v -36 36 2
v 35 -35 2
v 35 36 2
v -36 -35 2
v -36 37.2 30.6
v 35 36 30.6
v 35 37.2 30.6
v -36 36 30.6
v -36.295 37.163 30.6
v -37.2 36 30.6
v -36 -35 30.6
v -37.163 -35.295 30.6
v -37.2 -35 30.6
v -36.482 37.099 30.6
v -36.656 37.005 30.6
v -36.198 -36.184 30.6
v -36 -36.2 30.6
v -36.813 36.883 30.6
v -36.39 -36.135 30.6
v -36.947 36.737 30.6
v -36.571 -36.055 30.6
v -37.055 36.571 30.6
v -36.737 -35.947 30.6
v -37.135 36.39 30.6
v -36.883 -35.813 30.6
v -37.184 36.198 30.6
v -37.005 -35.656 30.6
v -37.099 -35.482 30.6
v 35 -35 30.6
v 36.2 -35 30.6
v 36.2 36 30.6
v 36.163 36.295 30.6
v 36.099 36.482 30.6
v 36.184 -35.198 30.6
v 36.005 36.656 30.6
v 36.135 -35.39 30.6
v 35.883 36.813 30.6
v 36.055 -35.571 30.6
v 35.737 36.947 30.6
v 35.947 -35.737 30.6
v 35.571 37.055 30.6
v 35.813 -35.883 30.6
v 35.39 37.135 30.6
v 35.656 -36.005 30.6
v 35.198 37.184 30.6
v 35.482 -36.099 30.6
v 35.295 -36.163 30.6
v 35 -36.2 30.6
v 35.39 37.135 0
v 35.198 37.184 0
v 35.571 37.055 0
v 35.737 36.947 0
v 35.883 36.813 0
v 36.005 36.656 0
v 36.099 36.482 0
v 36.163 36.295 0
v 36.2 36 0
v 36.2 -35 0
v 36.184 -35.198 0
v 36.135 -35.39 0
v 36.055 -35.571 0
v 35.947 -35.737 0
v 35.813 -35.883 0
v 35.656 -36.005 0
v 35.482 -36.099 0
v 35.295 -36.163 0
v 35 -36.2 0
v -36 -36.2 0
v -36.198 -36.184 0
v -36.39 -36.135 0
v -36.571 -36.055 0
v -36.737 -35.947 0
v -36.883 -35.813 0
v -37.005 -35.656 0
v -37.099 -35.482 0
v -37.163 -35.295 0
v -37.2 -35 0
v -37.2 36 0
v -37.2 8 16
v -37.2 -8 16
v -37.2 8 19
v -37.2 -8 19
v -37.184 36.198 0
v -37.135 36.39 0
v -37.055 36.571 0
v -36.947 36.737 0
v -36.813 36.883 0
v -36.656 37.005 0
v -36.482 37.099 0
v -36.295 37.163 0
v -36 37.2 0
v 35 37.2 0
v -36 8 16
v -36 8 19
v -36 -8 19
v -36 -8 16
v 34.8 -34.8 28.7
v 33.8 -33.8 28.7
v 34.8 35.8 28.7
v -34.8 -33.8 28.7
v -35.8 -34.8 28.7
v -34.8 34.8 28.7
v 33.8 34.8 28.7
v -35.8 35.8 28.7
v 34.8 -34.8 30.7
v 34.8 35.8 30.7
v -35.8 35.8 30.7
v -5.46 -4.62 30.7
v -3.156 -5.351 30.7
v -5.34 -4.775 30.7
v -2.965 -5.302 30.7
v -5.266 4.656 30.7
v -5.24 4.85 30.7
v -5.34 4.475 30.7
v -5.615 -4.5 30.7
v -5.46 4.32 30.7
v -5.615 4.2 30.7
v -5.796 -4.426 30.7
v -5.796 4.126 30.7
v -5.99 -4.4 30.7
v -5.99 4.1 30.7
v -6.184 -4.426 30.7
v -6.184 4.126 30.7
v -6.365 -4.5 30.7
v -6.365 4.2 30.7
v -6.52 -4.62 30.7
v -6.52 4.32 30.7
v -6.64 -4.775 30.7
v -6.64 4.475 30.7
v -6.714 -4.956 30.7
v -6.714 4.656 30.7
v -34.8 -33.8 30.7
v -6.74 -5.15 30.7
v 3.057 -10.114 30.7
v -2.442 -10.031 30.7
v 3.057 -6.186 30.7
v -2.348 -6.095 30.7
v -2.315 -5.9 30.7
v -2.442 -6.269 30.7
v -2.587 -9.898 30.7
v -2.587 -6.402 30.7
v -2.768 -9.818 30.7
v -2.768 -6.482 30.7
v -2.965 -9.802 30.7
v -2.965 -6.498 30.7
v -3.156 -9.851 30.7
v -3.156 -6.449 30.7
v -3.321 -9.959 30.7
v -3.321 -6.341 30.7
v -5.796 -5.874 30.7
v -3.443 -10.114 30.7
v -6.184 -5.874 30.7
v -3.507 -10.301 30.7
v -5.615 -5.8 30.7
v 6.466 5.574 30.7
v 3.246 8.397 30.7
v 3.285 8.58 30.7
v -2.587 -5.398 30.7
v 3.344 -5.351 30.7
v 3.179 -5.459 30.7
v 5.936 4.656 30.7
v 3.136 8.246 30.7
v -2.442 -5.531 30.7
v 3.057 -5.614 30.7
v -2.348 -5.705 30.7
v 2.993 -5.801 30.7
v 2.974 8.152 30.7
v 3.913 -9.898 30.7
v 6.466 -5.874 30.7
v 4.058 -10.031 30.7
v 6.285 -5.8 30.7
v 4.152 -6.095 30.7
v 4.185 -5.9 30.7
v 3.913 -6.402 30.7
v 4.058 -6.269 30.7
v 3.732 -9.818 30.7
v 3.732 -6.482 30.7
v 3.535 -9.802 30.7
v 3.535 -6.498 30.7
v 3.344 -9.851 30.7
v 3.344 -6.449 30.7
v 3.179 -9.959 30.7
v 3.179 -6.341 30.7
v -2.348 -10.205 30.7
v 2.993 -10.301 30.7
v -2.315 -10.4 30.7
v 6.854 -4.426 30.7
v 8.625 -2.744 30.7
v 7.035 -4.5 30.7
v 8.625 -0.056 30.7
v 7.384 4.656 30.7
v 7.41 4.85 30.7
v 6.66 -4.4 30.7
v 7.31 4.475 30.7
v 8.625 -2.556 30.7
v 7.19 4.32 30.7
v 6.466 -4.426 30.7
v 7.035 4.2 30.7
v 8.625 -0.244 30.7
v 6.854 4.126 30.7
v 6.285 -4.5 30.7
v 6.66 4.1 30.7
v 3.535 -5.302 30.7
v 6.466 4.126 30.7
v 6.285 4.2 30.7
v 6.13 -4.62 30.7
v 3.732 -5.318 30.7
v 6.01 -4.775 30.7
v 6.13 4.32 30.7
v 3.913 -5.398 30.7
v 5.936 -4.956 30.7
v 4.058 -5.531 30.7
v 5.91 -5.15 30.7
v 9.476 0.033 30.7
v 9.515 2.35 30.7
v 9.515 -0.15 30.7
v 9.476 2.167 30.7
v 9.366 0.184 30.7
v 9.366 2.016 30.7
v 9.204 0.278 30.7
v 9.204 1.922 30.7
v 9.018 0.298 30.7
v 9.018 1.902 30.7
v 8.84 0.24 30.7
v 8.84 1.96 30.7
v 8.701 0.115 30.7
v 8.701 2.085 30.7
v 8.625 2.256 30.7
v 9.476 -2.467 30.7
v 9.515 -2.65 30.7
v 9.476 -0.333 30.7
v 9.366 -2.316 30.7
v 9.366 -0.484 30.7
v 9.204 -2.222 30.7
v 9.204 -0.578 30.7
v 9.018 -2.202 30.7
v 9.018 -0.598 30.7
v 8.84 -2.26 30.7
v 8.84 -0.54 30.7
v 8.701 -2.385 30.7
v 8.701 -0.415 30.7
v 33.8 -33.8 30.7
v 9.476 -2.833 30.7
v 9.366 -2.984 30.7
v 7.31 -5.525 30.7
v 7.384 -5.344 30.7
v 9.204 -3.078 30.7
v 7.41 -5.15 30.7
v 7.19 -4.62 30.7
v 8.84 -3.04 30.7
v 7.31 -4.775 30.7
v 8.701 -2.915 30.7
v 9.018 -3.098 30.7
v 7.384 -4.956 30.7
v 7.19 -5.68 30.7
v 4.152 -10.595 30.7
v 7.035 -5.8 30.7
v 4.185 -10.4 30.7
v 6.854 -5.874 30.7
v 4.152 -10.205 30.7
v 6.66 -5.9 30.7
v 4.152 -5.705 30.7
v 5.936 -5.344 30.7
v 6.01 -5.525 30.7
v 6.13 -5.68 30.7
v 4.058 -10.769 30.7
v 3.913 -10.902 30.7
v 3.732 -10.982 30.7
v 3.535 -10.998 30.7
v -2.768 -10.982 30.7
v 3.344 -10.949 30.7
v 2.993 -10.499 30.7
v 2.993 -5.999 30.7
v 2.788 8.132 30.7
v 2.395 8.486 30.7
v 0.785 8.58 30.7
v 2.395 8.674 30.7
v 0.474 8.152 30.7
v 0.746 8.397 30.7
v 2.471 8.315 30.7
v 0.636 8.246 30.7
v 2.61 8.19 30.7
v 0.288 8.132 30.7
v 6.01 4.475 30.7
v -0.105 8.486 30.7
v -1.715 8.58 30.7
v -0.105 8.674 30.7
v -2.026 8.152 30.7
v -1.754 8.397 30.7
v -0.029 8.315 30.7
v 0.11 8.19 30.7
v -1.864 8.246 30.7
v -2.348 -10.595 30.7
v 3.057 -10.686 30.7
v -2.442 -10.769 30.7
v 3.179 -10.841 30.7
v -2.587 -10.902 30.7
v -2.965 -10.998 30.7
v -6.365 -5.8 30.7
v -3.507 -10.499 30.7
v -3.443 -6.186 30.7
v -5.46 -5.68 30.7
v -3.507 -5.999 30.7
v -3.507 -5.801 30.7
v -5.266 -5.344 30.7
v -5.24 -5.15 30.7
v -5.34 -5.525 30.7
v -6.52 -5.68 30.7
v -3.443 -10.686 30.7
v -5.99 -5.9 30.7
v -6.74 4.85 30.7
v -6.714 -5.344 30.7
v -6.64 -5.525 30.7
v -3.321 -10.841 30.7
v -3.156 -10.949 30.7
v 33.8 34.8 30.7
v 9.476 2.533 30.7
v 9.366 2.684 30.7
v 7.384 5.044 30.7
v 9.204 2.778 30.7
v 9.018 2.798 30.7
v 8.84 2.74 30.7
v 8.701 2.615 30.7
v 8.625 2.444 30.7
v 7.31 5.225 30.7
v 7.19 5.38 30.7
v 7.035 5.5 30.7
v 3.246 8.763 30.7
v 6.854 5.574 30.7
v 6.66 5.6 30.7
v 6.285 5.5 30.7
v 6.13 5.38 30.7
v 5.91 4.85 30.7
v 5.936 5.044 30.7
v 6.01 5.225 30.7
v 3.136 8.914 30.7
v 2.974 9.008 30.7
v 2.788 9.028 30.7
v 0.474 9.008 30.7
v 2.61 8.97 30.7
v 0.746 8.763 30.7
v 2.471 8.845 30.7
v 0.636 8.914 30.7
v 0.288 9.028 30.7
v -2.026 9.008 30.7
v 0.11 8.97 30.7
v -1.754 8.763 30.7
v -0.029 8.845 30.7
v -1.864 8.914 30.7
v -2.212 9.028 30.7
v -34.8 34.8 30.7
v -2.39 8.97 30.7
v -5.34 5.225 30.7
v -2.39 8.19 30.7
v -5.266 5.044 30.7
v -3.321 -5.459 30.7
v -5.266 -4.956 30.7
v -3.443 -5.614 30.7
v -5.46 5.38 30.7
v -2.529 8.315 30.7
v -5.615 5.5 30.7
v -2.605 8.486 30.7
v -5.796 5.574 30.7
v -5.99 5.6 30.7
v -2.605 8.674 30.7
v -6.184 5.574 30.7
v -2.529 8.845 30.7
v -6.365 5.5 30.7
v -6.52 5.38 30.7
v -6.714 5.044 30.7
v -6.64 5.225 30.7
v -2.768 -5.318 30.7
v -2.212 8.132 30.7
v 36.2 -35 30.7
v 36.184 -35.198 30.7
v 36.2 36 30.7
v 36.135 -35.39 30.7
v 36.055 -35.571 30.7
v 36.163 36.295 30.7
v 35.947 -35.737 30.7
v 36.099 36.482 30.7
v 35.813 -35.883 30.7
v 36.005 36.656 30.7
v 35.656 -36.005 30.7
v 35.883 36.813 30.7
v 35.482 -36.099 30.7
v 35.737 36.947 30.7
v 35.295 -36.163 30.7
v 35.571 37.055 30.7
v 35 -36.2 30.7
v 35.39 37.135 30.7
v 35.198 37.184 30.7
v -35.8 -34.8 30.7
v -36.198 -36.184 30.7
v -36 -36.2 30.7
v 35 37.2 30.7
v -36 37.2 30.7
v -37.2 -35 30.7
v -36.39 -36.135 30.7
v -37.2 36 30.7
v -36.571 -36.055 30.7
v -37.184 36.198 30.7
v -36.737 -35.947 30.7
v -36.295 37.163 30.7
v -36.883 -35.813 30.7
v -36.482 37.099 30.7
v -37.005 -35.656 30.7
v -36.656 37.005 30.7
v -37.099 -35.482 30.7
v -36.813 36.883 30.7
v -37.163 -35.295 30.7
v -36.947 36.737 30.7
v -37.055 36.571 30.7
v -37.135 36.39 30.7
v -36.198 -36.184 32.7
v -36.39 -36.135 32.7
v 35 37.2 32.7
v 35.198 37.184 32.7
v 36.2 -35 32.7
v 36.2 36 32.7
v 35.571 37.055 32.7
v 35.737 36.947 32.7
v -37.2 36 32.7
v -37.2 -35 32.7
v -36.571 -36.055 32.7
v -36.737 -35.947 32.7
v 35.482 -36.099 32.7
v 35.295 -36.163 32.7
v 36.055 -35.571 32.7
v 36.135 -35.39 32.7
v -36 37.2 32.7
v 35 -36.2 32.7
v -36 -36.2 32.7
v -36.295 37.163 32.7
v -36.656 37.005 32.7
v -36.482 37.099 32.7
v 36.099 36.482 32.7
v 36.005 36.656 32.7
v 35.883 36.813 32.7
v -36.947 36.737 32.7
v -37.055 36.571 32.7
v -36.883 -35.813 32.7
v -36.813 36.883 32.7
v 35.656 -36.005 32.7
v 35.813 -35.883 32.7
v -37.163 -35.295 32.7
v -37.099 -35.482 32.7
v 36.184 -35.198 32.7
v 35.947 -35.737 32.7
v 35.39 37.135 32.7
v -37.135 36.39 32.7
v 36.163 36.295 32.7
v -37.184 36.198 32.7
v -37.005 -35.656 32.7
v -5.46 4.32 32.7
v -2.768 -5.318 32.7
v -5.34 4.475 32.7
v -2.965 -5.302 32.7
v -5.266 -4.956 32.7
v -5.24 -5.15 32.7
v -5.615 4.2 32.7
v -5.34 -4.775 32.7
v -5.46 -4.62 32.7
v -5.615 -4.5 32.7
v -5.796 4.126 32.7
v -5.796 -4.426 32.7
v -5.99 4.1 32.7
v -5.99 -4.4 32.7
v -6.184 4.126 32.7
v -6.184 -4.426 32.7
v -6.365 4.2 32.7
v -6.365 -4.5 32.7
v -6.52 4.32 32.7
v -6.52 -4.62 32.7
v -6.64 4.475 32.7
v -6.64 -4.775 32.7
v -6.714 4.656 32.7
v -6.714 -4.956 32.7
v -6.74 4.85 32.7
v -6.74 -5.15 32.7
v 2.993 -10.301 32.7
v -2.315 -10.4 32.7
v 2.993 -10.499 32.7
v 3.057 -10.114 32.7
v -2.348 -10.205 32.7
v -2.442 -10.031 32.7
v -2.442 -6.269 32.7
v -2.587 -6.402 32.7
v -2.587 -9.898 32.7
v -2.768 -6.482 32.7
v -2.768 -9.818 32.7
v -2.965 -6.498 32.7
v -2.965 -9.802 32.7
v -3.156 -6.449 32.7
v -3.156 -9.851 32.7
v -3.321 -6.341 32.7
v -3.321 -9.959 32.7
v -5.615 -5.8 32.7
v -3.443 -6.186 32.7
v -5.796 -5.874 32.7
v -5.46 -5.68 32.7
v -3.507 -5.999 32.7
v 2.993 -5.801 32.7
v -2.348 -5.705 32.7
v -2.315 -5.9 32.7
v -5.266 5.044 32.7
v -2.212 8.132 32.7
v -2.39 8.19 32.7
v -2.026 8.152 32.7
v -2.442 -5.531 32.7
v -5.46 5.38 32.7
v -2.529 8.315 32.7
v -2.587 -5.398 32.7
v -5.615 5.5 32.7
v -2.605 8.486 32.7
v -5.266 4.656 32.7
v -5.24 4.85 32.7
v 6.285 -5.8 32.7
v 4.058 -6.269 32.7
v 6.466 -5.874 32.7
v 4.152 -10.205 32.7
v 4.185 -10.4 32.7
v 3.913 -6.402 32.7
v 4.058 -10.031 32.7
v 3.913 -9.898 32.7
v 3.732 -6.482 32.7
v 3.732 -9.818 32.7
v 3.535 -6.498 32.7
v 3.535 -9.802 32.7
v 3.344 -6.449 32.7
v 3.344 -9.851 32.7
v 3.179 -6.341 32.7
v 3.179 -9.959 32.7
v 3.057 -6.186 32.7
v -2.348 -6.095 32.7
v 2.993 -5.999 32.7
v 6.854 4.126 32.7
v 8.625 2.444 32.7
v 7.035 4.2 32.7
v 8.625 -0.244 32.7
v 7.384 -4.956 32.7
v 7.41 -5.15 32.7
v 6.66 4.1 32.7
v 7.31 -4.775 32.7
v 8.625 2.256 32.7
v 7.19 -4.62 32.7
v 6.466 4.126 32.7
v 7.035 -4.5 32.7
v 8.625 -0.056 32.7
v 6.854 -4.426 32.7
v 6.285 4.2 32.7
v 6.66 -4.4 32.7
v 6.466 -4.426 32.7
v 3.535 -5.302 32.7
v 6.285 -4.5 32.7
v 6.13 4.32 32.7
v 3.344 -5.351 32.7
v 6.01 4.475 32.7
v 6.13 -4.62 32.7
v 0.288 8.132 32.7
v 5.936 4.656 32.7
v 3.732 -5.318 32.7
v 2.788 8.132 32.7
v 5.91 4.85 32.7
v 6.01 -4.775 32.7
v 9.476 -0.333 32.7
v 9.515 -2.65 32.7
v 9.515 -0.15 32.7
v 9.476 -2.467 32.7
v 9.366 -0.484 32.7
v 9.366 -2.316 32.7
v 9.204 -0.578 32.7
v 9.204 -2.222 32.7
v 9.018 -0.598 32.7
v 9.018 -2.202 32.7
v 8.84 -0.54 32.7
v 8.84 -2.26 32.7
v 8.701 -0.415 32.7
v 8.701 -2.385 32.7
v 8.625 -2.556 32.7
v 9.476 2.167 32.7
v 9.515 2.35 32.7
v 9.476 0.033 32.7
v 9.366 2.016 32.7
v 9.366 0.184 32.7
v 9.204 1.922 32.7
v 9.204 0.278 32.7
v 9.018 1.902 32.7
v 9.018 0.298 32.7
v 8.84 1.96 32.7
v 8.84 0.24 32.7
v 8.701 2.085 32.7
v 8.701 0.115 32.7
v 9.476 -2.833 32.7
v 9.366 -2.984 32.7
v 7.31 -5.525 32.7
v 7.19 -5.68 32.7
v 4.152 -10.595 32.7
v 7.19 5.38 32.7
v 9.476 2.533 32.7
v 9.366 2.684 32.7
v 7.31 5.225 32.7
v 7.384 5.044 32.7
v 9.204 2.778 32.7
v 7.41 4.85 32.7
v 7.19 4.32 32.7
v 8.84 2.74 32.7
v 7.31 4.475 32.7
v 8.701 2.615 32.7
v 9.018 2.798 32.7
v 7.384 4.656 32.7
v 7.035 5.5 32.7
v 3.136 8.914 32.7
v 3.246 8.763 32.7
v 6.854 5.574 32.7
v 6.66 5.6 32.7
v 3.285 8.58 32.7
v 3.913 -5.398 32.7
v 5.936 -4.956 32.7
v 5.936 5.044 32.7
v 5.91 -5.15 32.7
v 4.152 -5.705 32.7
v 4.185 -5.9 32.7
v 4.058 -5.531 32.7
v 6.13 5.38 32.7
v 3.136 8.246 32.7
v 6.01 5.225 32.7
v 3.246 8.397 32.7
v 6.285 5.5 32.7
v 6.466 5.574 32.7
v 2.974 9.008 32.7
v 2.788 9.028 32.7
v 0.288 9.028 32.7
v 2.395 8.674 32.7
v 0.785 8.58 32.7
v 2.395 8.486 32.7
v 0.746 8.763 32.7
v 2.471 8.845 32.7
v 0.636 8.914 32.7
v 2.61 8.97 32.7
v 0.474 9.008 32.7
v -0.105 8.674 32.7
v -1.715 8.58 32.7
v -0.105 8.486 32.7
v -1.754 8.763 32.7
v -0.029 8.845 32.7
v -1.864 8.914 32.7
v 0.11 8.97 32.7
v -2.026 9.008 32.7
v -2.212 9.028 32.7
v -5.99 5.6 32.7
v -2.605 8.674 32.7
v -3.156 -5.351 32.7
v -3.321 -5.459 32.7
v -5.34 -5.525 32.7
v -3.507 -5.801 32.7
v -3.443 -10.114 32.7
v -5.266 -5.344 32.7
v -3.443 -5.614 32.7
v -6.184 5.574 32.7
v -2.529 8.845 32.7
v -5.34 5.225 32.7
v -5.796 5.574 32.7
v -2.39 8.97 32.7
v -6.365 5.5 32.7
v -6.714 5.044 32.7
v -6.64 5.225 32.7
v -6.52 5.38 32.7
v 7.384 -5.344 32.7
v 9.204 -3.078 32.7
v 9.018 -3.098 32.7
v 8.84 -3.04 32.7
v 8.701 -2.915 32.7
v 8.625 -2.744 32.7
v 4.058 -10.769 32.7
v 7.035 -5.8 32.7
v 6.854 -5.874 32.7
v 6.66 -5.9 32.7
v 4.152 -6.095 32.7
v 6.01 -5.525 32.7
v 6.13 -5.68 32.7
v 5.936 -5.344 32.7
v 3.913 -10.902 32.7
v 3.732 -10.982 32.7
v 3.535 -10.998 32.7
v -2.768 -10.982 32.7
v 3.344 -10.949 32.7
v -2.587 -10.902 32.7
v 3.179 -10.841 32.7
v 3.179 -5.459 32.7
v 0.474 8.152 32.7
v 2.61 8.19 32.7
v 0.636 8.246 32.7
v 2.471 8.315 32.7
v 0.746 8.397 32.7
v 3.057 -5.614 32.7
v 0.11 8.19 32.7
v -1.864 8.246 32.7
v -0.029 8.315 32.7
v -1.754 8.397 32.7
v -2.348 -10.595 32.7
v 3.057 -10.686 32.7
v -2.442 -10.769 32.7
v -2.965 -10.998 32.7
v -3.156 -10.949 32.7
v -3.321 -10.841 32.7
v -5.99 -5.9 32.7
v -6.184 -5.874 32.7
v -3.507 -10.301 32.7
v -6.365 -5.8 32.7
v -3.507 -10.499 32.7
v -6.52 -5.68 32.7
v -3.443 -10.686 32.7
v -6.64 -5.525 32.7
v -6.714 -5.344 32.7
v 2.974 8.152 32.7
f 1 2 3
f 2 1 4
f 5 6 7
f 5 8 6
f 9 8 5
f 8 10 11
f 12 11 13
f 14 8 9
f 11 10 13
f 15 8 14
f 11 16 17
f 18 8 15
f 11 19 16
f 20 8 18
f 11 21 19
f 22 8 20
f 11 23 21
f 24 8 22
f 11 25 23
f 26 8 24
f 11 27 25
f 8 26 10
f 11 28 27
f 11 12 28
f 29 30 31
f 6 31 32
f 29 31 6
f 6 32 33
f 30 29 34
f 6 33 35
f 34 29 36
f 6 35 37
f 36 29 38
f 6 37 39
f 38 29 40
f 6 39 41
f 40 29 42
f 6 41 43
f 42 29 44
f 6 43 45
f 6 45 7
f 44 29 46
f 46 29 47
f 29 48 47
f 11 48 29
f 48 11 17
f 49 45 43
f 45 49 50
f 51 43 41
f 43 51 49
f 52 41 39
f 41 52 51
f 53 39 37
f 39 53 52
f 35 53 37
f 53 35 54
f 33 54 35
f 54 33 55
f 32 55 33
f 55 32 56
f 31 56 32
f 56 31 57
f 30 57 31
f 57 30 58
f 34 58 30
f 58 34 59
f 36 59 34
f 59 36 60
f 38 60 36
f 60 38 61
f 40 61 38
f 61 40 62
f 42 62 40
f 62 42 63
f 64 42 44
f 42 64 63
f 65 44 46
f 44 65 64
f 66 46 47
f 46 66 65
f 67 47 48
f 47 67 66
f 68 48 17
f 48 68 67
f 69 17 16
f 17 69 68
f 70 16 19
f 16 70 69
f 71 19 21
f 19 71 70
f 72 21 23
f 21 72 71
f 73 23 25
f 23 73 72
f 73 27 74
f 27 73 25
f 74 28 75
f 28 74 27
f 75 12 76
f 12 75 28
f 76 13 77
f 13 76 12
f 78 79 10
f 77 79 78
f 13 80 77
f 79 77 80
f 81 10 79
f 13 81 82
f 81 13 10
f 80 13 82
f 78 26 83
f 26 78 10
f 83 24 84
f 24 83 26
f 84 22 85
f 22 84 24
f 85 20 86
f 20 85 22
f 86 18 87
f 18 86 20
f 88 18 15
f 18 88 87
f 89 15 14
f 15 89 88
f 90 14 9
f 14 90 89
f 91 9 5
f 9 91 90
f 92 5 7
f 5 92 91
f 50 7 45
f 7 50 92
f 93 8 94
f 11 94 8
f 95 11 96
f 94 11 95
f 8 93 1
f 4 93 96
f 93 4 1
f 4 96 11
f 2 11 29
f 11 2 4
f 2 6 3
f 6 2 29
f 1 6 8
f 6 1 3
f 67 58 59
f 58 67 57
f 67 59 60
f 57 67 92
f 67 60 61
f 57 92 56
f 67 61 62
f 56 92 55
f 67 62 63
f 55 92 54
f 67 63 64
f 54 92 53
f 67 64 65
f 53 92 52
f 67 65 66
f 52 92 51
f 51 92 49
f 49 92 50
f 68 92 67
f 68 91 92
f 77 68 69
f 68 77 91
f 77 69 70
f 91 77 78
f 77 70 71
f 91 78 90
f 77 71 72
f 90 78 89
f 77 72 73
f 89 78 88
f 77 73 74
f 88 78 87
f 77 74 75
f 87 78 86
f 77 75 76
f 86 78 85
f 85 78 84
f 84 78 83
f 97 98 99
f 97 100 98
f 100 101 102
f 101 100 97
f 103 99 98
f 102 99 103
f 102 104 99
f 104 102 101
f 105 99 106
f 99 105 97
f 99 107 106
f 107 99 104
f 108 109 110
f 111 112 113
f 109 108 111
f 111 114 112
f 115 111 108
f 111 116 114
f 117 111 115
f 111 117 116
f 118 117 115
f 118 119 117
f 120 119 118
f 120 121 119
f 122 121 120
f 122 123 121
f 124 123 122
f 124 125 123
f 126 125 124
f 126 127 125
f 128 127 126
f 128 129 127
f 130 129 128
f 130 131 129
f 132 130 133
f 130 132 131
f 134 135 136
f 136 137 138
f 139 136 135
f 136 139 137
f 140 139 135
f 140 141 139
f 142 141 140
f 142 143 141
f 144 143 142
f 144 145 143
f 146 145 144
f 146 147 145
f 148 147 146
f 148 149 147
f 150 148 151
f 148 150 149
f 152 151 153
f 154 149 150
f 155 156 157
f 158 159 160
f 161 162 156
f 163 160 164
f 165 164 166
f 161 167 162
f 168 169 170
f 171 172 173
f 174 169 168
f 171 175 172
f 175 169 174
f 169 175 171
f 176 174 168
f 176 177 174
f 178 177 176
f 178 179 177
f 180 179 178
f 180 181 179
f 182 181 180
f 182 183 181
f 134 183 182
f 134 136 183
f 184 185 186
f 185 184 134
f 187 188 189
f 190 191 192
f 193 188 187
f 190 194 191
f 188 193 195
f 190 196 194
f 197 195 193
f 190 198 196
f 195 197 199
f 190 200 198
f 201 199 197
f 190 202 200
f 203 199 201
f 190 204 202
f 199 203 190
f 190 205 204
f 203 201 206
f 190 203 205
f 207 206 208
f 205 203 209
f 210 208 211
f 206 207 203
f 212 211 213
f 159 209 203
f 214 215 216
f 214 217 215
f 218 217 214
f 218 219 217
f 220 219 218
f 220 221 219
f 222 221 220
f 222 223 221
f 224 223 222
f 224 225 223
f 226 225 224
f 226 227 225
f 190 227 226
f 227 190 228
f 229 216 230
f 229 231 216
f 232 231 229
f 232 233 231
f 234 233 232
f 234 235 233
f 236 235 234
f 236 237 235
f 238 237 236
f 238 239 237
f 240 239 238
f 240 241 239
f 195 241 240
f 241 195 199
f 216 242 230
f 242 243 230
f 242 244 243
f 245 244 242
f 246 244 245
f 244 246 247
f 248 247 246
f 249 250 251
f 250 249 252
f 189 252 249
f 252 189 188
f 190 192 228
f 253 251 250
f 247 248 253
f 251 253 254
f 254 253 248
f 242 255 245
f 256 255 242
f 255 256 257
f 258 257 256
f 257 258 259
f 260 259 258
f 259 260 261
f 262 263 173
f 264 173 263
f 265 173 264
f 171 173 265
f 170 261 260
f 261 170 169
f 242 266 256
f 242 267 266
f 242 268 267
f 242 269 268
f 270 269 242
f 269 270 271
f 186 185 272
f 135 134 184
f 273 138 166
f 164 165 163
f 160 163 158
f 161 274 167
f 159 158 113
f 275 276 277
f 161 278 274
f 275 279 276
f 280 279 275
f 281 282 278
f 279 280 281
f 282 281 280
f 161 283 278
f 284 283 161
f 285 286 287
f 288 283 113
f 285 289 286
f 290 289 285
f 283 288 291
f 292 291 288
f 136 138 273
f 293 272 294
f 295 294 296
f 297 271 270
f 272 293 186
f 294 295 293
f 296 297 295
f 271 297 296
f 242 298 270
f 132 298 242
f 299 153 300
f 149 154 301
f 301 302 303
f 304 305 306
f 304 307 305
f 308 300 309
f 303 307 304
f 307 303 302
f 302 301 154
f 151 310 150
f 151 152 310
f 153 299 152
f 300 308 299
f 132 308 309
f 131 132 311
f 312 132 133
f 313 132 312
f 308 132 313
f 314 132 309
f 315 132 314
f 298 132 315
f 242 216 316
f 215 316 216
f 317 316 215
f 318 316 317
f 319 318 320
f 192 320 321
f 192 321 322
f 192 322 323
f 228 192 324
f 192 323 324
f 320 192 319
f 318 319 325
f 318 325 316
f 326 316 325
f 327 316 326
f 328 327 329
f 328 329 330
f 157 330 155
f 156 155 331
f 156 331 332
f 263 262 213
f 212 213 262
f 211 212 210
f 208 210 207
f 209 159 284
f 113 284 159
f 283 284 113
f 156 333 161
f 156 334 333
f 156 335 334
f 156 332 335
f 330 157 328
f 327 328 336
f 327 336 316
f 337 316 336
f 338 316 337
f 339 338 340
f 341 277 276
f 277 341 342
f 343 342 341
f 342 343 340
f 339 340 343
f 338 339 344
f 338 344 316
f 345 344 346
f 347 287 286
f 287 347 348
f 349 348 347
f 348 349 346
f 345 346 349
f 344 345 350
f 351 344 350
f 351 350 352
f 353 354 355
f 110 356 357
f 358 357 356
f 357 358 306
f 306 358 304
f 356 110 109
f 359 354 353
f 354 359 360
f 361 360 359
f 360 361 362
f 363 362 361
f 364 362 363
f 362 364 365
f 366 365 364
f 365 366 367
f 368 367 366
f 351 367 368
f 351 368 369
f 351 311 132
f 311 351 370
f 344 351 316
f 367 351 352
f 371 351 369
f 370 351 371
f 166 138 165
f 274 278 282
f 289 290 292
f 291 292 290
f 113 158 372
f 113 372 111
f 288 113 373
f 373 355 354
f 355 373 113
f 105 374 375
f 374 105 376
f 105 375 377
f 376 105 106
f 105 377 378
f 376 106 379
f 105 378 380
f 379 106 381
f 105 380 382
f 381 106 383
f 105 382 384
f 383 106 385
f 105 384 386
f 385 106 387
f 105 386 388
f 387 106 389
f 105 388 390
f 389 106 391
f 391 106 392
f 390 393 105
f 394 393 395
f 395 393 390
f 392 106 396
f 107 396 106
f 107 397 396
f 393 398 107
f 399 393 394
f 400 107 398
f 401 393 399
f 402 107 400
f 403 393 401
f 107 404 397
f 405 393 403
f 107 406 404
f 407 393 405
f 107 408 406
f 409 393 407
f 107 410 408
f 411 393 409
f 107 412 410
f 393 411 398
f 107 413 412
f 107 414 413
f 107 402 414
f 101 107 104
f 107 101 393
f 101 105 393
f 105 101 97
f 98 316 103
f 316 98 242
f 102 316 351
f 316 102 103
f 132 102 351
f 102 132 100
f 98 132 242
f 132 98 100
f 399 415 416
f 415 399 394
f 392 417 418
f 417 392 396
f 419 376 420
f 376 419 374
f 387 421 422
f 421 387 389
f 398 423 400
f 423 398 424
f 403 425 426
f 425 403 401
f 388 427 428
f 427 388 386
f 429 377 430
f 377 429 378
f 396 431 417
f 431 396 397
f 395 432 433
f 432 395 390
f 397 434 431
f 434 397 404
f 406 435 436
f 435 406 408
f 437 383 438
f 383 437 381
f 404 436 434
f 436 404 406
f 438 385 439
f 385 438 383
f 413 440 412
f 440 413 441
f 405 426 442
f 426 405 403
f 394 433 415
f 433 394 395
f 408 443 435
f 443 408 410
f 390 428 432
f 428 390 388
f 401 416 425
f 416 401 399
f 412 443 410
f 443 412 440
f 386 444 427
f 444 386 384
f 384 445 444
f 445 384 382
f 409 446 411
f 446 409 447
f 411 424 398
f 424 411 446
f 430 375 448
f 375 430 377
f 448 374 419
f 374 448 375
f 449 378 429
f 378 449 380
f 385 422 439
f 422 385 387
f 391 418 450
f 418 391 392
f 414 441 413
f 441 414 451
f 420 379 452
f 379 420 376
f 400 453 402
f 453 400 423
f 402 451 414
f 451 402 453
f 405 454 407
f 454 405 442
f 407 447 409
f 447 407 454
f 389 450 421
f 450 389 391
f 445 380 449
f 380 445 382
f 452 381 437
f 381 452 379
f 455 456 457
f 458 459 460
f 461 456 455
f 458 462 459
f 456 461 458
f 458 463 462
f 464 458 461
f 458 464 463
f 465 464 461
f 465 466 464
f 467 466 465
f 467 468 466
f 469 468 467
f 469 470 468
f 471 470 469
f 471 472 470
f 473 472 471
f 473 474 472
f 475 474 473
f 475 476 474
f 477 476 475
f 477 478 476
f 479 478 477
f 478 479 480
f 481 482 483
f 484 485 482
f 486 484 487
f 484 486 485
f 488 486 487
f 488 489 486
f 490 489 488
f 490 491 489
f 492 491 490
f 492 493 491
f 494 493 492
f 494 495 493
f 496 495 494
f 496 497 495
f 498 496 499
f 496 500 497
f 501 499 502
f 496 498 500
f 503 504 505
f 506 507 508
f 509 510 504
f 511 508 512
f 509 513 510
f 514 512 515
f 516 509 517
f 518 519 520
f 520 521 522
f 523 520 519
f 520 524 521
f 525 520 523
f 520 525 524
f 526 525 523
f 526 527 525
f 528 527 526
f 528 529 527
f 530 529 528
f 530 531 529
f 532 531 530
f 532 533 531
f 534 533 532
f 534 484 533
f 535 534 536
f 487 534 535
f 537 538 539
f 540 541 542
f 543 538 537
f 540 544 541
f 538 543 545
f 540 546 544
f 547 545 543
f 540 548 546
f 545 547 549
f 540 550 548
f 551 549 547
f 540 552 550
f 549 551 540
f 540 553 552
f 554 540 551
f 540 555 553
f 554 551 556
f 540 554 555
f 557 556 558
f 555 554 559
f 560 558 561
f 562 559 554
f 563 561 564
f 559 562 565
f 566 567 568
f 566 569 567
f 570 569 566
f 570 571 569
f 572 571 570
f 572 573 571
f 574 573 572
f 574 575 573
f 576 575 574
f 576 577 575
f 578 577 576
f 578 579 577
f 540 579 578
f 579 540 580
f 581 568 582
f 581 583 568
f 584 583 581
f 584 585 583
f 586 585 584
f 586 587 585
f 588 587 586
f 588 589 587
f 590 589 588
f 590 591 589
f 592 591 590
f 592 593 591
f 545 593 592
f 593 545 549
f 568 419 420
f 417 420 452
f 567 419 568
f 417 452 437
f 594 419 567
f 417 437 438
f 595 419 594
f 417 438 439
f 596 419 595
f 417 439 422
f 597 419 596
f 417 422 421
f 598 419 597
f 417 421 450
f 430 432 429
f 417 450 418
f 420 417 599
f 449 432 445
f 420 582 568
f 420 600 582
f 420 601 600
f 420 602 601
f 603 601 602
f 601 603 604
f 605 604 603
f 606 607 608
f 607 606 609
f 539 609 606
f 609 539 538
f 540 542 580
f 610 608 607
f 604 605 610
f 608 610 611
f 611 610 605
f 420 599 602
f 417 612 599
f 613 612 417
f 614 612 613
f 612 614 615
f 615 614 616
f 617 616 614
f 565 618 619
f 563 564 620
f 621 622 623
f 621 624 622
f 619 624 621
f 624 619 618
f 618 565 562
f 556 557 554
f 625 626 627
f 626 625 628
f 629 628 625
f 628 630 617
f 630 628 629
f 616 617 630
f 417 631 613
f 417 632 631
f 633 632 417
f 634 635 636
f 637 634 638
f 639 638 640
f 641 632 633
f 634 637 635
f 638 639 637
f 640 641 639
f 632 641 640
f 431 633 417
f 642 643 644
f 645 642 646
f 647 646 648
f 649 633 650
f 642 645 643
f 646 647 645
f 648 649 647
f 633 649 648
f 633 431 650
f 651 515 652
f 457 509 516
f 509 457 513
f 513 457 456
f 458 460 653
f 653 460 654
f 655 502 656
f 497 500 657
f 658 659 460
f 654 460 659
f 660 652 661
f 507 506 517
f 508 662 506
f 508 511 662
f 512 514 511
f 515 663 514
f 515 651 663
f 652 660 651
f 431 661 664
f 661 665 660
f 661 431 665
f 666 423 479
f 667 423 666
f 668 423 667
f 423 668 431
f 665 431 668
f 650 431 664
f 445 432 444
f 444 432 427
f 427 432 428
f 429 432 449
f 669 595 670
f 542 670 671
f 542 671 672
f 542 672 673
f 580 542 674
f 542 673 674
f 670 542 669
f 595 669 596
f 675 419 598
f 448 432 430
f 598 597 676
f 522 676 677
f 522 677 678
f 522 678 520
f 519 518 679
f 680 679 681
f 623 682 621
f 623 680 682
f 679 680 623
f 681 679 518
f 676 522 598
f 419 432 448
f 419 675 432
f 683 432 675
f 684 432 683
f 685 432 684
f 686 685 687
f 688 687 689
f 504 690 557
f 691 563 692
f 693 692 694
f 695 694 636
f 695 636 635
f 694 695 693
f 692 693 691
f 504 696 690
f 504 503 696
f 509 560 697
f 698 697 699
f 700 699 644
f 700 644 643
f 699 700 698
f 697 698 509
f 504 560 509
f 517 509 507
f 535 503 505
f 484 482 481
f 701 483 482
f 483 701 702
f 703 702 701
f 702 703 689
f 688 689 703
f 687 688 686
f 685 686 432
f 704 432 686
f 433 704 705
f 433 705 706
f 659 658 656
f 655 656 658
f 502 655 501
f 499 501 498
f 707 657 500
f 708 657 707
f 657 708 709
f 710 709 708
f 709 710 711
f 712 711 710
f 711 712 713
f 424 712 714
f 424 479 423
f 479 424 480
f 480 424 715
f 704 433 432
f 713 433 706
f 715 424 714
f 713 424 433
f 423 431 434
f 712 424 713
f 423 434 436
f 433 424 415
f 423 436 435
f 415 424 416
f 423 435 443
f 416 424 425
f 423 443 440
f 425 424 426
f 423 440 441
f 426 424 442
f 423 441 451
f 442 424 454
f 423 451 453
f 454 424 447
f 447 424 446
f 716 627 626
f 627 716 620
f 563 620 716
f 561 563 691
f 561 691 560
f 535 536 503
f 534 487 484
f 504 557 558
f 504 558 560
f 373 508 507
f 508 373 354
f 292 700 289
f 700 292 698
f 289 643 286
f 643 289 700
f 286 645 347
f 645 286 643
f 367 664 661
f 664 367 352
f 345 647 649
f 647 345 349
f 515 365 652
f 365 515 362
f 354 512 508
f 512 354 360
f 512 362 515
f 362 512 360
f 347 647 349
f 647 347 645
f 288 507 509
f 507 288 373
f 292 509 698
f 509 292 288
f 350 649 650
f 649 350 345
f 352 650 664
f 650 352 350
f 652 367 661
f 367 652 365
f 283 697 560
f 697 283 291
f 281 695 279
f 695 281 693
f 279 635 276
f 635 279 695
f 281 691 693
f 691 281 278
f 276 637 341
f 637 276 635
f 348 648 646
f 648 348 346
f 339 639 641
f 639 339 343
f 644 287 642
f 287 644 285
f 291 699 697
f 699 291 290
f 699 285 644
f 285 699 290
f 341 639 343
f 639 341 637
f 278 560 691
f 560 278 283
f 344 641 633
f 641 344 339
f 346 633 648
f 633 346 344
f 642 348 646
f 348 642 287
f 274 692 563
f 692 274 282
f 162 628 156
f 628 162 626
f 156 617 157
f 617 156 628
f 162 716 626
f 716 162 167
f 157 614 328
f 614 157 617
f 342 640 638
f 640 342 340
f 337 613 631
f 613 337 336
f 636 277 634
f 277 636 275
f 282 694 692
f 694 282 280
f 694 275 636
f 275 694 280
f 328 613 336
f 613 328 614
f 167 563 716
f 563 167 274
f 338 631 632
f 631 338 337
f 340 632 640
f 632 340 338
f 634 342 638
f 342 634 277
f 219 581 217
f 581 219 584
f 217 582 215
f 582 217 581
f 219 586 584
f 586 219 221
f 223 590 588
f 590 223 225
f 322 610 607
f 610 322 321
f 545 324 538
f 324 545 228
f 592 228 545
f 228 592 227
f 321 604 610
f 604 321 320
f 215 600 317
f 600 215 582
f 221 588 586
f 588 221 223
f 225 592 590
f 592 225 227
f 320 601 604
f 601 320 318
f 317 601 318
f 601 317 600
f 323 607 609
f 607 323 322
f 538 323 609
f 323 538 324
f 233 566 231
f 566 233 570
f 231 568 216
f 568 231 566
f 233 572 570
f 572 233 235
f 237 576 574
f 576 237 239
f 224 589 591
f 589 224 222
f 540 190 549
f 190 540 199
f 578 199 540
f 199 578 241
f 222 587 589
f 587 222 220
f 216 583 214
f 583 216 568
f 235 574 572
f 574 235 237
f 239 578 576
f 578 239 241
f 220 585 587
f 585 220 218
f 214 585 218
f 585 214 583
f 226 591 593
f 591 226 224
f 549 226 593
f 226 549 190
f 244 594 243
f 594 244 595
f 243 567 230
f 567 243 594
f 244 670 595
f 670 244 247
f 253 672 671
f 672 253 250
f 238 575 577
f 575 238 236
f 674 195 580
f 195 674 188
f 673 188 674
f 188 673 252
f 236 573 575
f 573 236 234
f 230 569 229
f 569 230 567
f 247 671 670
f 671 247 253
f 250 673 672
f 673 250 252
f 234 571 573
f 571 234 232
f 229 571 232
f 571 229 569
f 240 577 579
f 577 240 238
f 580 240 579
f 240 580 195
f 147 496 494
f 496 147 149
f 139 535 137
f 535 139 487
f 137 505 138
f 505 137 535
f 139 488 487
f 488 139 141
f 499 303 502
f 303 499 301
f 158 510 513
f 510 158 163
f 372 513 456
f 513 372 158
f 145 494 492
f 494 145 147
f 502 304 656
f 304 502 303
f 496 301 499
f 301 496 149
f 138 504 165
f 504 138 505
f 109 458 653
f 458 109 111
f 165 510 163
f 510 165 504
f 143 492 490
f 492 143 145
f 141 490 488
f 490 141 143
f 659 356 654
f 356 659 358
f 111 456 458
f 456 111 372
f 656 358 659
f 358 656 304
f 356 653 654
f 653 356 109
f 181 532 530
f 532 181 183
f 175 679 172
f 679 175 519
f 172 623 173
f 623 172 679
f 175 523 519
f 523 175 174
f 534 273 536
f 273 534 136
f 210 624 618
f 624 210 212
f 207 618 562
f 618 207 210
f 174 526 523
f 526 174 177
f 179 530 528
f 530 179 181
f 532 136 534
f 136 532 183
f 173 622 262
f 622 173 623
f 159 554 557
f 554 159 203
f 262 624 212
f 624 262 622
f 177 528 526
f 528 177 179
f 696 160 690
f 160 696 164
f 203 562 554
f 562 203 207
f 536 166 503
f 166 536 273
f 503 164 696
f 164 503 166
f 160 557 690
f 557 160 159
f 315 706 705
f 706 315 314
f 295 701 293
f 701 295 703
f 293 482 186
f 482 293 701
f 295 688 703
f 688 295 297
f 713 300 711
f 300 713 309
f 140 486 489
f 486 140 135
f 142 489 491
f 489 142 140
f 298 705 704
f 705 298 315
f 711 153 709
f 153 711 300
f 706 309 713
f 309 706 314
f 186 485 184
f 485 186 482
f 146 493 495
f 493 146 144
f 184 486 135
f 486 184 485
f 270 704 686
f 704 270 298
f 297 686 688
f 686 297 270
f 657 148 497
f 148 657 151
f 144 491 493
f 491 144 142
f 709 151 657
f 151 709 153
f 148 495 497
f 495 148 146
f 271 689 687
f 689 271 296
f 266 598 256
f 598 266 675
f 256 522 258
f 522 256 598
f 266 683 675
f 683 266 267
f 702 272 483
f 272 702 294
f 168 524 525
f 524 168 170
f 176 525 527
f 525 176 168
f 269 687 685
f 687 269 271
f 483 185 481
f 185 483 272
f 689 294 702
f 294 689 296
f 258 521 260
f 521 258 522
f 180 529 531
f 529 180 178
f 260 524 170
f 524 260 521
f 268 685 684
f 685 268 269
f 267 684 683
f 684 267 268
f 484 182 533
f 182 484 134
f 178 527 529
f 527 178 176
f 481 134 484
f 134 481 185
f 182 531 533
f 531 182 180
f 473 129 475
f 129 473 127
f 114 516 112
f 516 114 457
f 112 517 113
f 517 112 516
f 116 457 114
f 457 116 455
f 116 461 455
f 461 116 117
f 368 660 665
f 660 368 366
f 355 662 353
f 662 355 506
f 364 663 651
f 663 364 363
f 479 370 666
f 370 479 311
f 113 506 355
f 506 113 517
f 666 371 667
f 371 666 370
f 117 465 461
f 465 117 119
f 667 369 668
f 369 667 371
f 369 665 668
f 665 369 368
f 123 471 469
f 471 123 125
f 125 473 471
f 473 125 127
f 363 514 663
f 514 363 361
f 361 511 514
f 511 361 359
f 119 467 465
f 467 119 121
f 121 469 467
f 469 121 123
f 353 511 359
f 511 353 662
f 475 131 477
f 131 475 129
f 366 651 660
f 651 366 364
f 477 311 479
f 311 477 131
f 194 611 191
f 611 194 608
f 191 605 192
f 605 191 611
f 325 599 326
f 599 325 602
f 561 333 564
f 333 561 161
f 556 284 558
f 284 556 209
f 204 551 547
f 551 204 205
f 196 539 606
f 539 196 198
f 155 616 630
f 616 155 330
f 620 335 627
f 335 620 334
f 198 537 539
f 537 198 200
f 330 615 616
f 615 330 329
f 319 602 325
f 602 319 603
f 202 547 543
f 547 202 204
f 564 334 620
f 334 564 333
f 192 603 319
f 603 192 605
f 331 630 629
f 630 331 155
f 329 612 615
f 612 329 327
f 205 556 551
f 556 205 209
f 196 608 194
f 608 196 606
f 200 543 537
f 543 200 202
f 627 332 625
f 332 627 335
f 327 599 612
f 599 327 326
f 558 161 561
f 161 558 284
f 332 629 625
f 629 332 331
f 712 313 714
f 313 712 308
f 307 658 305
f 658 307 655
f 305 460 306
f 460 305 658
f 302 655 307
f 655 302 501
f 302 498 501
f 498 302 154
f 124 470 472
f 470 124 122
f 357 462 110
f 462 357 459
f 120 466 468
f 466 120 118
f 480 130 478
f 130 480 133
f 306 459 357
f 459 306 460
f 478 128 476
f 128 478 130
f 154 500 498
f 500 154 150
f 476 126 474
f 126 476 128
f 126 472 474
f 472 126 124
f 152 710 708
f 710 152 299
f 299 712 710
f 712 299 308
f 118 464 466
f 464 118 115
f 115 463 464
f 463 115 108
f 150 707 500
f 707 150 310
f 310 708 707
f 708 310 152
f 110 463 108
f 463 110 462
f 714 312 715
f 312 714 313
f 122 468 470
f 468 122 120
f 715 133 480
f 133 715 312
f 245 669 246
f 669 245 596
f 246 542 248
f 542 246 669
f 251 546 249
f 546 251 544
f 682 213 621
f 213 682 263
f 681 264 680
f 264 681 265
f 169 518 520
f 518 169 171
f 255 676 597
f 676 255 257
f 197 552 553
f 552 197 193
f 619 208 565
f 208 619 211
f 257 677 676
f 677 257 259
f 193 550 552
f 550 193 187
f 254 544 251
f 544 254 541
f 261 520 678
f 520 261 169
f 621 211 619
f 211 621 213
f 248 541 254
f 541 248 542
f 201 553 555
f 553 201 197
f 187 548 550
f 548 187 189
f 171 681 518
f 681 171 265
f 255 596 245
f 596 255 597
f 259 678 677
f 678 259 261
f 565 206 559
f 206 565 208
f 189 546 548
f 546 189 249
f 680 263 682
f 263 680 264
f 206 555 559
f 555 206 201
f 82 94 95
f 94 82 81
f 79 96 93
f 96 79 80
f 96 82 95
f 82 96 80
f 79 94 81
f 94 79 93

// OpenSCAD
///* [Rendering options] */
// Show placeholder PCB in OpenSCAD preview
show_pcb = false;
// Lid mounting method
lid_model = "cap"; // [cap, inner-fit]
// Conditional rendering
render = "all"; // [all, case, lid]

/* [Dimensions] */
// Height of the PCB mounting stand-offs between the bottom of the case and the PCB
standoff_height = 5;
// PCB thickness
pcb_thickness = 1.6;
// Bottom layer thickness
floor_height = 2;
// Case wall thickness
wall_thickness = 1.2;
// Space between the top of the PCB and the top of the case
headroom = 20;

/* [Hidden] */
$fa = $preview ? 10 : 4;
$fs = 0.2;
inner_height = floor_height + standoff_height + pcb_thickness + headroom;

module centered_hole_diameter(center_x, center_y, diameter)
{ // These holes are in the kicad coord system
    coords = [ center_x, center_y ];
    translate([ coords[0], coords[1], -0.5 ]) cylinder(h = floor_height + 1, d = diameter, center = false);
}

module centered_hole_radius(center_x, center_y, radius)
{ // These holes are in the kicad coord system
    coords = [ center_x, center_y ];
    translate([ coords[0], coords[1], -0.5 ]) cylinder(h = floor_height + 1, r = radius, center = false);
}

module wall(thickness, height)
{
    linear_extrude(height, convexity = 10)
    {
        difference()
        {
            offset(r = thickness) children();
            children();
        }
    }
}

module bottom(thickness, height)
{
    linear_extrude(height, convexity = 3)
    {
        offset(r = thickness) children();
    }
}

module joystick()
{
    centered_hole_diameter(center_x = 114.835, center_y = 116.42, diameter = 0.9);
    centered_hole_diameter(center_x = 117.335, center_y = 116.42, diameter = 0.9);
    centered_hole_diameter(center_x = 119.835, center_y = 116.42, diameter = 0.9);

    // Right Side data holes
    centered_hole_diameter(center_x = 126.065, center_y = 122.65, diameter = 0.9);
    centered_hole_diameter(center_x = 126.065, center_y = 125.15, diameter = 0.9);
    centered_hole_diameter(center_x = 126.065, center_y = 127.65, diameter = 0.9);

    // Button holes
    centered_hole_diameter(center_x = 114.085, center_y = 130.9, diameter = 1.2);
    centered_hole_diameter(center_x = 120.585, center_y = 130.9, diameter = 1.2);
    centered_hole_diameter(center_x = 114.085, center_y = 135.4, diameter = 1.2);
    centered_hole_diameter(center_x = 120.585, center_y = 135.4, diameter = 1.2);

    // Mounting holes
    centered_hole_diameter(center_x = 111.01, center_y = 120.15, diameter = 1.5);
    centered_hole_diameter(center_x = 123.66, center_y = 120.15, diameter = 1.5);
    centered_hole_diameter(center_x = 111.01, center_y = 130.15, diameter = 1.5);
    centered_hole_diameter(center_x = 123.66, center_y = 130.15, diameter = 1.5);
}

module slider()
{
    centered_hole_radius(center_x = 62.025, center_y = 135.62, radius = 0.8);
    centered_hole_radius(center_x = 65.775, center_y = 135.62, radius = 0.8);

    // Pins
    centered_hole_radius(center_x = 63.9, center_y = 113.97, radius = 1);
    centered_hole_radius(center_x = 63.9, center_y = 31.77, radius = 1);

    // Top hole
    centered_hole_radius(center_x = 62.025, center_y = 8.12, radius = 0.8);
}

module lid(thickness, height, edge)
{
    difference()
    {
        union()
        {
            linear_extrude(height, convexity = 10)
            {
                offset(r = thickness) children();
            }
            translate([ 0, 0, -edge ]) difference()
            {
                linear_extrude(edge, convexity = 10)
                {
                    offset(r = -0.2) children();
                }
                translate([ 0, 0, -0.5 ]) linear_extrude(edge + 1, convexity = 10)
                {
                    offset(r = -1.2) children();
                }
            }
        }

        // === Logo ===
        // translate([ 65, 22, height - 1 ]) linear_extrude(1.1)
        // {
        //     offset(r = 0.1) scale([ 0.07, -0.07, 1 ]) import("case-logo.svg", center = true);
        // }

        // === Buttons ===
        // centered_hole_diameter(100 - 23, 119, 33.3);

        // === Slider ===
        // Bottom holes

        // translate() 
        // translate([- 50, 0, 0 ]) 
        // slider();

        // === Joystick ===
        // Top data holes
        
        translate([ -87+5, -95+5, 0 ]) joystick();
    }
}

module box(wall_thick, bottom_layers, height)
{
    if (render == "all" || render == "case")
    {
        difference()
        {
            union()
            {
                translate([ 0, 0, bottom_layers ]) wall(wall_thick, height) children();
                bottom(wall_thick, bottom_layers) children();
            }
        }
    }

    if (render == "all" || render == "lid")
    {
        translate([ 0, 0, height + bottom_layers + 0.1 ])
            lid(wall_thick, bottom_layers, lid_model == "inner-fit" ? headroom - 2.5 : bottom_layers) children();
    }
}

module mount(drill, space, height)
{
    translate([ 0, 0, height / 2 ]) difference()
    {
        cylinder(h = height, r = (space / 2), center = true);
        cylinder(h = (height * 2), r = (drill / 2), center = true);

        translate([ 0, 0, height / 2 + 0.01 ]) children();
    }
}

module connector(min_x, min_y, max_x, max_y, height)
{
    size_x = max_x - min_x;
    size_y = max_y - min_y;
    translate([ (min_x + max_x) / 2, (min_y + max_y) / 2, height / 2 ]) cube([ size_x, size_y, height ], center = true);
}

module pcb()
{
    thickness = 1.6;

    color("#009900") difference()
    {
        linear_extrude(thickness)
        {
            polygon(points = [ [ 0, 0 ], [ 135.48, 0 ], [ 135.48, 143.5 ], [ 0, 143.5 ] ]);
        }
    }
}

module case_outline()
{
    polygon(points = [ [ -1, -1 ], [ 70, -1 ], [ 70, 70 ], [ -1, 70 ] ]);
}

rotate([ render == "lid" ? 180 : 0, 0, 0 ]) scale([ 1, -1, 1 ]) translate([ -70/2, -70/2, 0 ])
{
    pcb_top = floor_height + standoff_height + pcb_thickness;

    difference()
    {
        box(wall_thickness, floor_height, inner_height)
        {
            case_outline();
        }

        // // Add square hole in wall at y=0
        // // Accounting for the translation and scaling
        // scale([ 1, -1, 1 ])                          // Match the case's scaling
        // translate([ 50 - 8, 0, 30 ])         // Position relative to the case
        // cube([ 16, wall_thickness * 2 + 1, 3 ]); // Make hole slightly wider than wall


        // Right wall hole - fixed coordinates
        scale([ 1, -1, 1 ])                          // Match the case's scaling
        translate([ -4, -70/2 - 8, 16 ])         
        cube([ wall_thickness * 2 + 1, 16, 3 ]); 
    }

    // // Right wall hole - fixed coordinates
    //     scale([ 1, -1, 1 ])                          // Match the case's scaling
    //     translate([ 100 + wall_thickness, -71.75, 30 ])         
    //     cube([ wall_thickness * 2 + 1, 16, 3 ]); 

    if (show_pcb && $preview)
    {
        translate([ 0, 0, floor_height + standoff_height ]) pcb();
    }
}
